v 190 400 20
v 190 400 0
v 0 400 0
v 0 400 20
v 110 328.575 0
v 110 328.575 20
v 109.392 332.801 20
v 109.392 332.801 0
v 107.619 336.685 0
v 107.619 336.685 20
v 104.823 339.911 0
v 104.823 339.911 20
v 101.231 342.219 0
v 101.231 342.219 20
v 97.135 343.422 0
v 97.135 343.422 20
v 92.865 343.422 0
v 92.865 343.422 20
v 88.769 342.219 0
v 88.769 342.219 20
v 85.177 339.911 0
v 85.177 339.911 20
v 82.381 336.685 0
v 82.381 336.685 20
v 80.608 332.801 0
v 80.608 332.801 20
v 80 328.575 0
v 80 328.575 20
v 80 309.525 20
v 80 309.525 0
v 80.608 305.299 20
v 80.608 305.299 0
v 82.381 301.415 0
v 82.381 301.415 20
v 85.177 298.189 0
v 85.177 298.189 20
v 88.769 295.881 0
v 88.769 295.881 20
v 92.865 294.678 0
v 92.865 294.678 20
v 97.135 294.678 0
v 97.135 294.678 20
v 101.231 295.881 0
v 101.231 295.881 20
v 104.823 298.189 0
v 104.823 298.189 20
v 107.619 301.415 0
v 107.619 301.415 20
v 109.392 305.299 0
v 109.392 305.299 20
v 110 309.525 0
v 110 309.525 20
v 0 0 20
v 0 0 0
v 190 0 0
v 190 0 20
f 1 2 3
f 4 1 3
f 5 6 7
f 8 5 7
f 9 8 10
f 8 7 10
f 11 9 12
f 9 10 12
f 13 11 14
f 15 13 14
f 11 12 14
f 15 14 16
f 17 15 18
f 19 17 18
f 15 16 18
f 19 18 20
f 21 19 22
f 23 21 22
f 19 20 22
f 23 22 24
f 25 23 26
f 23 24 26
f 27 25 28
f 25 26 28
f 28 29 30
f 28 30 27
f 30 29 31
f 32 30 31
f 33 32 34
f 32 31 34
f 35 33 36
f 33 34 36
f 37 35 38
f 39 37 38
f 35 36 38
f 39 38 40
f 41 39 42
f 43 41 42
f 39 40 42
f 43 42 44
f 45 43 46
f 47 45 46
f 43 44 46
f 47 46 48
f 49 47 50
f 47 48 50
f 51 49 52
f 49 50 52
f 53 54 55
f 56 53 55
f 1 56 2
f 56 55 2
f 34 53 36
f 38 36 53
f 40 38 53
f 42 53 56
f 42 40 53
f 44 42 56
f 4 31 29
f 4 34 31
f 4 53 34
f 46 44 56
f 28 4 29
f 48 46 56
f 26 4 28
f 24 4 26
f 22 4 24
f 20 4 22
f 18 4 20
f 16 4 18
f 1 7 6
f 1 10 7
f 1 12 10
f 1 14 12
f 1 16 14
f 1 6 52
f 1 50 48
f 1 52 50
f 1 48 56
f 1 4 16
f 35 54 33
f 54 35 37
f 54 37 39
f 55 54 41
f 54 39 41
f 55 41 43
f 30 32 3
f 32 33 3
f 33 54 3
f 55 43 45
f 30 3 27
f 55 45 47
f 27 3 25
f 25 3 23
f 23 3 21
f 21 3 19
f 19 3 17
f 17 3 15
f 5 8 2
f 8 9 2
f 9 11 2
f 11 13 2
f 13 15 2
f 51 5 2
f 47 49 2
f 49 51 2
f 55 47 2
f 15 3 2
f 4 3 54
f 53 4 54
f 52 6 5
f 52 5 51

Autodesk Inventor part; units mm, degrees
ref_plane "YZ Plane" through (0, 0, 0) normal (1, 0, 0) x (0, 1, 0)
ref_plane "XZ Plane" through (0, 0, 0) normal (0, 1, 0) x (-1, 0, 0)
ref_plane "XY Plane" through (0, 0, 0) normal (0, 0, 1) x (1, 0, 0)
sketch "Sketch1" plane through (0, 0, 0) normal (0, 0, 1) x (1, 0, 0)
  line L0 (0, 0) -> (190, 0)
  line L1 (190, 0) -> (190, 400)
  line L2 (190, 400) -> (0, 400)
  line L3 (0, 400) -> (0, 0)
  dimension "d0" = 190
  dimension "d1" = 400
extrude "Extrusion1" add sketch "Sketch1" along normal blind 20
sketch "Sketch2" plane through (0, 0, 20) normal (0, 0, 1) x (1, 0, 0)
  circle A0 centre (95, 328.575) radius 5 construction
  circle A1 centre (95, 309.525) radius 5 construction
  arc A2 (110, 328.575) -> (80, 328.575) centre (95, 328.575) ccw construction
  arc A3 (80, 309.525) -> (110, 309.525) centre (95, 309.525) ccw construction
  line L0 (95, 309.525) -> (110, 309.525) construction
  line L1 (95, 309.525) -> (80, 309.525) construction
  line L2 (80, 309.525) -> (80, 328.575)
  line L3 (110, 328.575) -> (110, 309.525)
  arc A4 (110, 328.575) -> (80, 328.575) centre (95, 328.575) ccw
  arc A5 (80, 309.525) -> (110, 309.525) centre (95, 309.525) ccw
  point P0 (0, 0)
  dimension "d4" = 15
  dimension "d5" = 15
  dimension "d6" = 180
extrude "Extrusion2" cut sketch "Sketch2" against normal blind 20
equation "\"d0\" = maxw - 4 * nutdist"
equation "\"d1\" = maxh"
equation "\"d2\" = supt"
equation "\"d7\" = supt"
equation "\"maxh\" = 400"
equation "\"lcsd\" = 19.05"
equation "\"lcwd1\" = 25"
equation "\"lcwd2\" = 34"
equation "\"lch1\" = 39"
equation "\"lcwd3\" = 43"
equation "\"dia1\" = 6"
equation "\"td\" = 18"
equation "\"bhh\" = 6"
equation "\"sw\" = 25"
equation "\"sh\" = 31"
equation "\"spacert\" = 2"
equation "\"supt\" = 20"
equation "\"pvct\" = 5"
equation "\"dia3\" = 8"
equation "\"dia4\" = 11"
equation "\"tankl\" = 379"
equation "\"play\" = 9"
equation "\"holeh\" = 26"
equation "\"surroundt\" = 5"
equation "\"slack\" = 0.5"
equation "\"play2\" = 3"
equation "\"diacucl\" = 32"
equation "\"diaoverflow\" = 25"
equation "\"diawater\" = 25"
equation "\"diaph\" = 32"
equation "\"diaair\" = 32"
equation "\"diasurroundhole\" = 42"
equation "\"diagrate\" = 12"
equation "\"gratespacing\" = 12.02082"
equation "\"sidedist\" = 13.9375"
equation "\"bottomdist\" = 9.6355"
equation "\"diahcl\" = 32"
equation "\"bracketwtop\" = 6"
equation "\"bracketwbottom\" = 6"
equation "\"nett\" = 1"
equation "\"nethole\" = 16"
equation "\"nettop\" = 7"
equation "\"netside\" = 3.5"
equation "\"netholespacing\" = 2"
equation "\"diaetape\" = 32"
equation "\"maxw\" = 350"
equation "\"nutdist\" = 40"
properties part number "support plate" material "PVC-Piping"
